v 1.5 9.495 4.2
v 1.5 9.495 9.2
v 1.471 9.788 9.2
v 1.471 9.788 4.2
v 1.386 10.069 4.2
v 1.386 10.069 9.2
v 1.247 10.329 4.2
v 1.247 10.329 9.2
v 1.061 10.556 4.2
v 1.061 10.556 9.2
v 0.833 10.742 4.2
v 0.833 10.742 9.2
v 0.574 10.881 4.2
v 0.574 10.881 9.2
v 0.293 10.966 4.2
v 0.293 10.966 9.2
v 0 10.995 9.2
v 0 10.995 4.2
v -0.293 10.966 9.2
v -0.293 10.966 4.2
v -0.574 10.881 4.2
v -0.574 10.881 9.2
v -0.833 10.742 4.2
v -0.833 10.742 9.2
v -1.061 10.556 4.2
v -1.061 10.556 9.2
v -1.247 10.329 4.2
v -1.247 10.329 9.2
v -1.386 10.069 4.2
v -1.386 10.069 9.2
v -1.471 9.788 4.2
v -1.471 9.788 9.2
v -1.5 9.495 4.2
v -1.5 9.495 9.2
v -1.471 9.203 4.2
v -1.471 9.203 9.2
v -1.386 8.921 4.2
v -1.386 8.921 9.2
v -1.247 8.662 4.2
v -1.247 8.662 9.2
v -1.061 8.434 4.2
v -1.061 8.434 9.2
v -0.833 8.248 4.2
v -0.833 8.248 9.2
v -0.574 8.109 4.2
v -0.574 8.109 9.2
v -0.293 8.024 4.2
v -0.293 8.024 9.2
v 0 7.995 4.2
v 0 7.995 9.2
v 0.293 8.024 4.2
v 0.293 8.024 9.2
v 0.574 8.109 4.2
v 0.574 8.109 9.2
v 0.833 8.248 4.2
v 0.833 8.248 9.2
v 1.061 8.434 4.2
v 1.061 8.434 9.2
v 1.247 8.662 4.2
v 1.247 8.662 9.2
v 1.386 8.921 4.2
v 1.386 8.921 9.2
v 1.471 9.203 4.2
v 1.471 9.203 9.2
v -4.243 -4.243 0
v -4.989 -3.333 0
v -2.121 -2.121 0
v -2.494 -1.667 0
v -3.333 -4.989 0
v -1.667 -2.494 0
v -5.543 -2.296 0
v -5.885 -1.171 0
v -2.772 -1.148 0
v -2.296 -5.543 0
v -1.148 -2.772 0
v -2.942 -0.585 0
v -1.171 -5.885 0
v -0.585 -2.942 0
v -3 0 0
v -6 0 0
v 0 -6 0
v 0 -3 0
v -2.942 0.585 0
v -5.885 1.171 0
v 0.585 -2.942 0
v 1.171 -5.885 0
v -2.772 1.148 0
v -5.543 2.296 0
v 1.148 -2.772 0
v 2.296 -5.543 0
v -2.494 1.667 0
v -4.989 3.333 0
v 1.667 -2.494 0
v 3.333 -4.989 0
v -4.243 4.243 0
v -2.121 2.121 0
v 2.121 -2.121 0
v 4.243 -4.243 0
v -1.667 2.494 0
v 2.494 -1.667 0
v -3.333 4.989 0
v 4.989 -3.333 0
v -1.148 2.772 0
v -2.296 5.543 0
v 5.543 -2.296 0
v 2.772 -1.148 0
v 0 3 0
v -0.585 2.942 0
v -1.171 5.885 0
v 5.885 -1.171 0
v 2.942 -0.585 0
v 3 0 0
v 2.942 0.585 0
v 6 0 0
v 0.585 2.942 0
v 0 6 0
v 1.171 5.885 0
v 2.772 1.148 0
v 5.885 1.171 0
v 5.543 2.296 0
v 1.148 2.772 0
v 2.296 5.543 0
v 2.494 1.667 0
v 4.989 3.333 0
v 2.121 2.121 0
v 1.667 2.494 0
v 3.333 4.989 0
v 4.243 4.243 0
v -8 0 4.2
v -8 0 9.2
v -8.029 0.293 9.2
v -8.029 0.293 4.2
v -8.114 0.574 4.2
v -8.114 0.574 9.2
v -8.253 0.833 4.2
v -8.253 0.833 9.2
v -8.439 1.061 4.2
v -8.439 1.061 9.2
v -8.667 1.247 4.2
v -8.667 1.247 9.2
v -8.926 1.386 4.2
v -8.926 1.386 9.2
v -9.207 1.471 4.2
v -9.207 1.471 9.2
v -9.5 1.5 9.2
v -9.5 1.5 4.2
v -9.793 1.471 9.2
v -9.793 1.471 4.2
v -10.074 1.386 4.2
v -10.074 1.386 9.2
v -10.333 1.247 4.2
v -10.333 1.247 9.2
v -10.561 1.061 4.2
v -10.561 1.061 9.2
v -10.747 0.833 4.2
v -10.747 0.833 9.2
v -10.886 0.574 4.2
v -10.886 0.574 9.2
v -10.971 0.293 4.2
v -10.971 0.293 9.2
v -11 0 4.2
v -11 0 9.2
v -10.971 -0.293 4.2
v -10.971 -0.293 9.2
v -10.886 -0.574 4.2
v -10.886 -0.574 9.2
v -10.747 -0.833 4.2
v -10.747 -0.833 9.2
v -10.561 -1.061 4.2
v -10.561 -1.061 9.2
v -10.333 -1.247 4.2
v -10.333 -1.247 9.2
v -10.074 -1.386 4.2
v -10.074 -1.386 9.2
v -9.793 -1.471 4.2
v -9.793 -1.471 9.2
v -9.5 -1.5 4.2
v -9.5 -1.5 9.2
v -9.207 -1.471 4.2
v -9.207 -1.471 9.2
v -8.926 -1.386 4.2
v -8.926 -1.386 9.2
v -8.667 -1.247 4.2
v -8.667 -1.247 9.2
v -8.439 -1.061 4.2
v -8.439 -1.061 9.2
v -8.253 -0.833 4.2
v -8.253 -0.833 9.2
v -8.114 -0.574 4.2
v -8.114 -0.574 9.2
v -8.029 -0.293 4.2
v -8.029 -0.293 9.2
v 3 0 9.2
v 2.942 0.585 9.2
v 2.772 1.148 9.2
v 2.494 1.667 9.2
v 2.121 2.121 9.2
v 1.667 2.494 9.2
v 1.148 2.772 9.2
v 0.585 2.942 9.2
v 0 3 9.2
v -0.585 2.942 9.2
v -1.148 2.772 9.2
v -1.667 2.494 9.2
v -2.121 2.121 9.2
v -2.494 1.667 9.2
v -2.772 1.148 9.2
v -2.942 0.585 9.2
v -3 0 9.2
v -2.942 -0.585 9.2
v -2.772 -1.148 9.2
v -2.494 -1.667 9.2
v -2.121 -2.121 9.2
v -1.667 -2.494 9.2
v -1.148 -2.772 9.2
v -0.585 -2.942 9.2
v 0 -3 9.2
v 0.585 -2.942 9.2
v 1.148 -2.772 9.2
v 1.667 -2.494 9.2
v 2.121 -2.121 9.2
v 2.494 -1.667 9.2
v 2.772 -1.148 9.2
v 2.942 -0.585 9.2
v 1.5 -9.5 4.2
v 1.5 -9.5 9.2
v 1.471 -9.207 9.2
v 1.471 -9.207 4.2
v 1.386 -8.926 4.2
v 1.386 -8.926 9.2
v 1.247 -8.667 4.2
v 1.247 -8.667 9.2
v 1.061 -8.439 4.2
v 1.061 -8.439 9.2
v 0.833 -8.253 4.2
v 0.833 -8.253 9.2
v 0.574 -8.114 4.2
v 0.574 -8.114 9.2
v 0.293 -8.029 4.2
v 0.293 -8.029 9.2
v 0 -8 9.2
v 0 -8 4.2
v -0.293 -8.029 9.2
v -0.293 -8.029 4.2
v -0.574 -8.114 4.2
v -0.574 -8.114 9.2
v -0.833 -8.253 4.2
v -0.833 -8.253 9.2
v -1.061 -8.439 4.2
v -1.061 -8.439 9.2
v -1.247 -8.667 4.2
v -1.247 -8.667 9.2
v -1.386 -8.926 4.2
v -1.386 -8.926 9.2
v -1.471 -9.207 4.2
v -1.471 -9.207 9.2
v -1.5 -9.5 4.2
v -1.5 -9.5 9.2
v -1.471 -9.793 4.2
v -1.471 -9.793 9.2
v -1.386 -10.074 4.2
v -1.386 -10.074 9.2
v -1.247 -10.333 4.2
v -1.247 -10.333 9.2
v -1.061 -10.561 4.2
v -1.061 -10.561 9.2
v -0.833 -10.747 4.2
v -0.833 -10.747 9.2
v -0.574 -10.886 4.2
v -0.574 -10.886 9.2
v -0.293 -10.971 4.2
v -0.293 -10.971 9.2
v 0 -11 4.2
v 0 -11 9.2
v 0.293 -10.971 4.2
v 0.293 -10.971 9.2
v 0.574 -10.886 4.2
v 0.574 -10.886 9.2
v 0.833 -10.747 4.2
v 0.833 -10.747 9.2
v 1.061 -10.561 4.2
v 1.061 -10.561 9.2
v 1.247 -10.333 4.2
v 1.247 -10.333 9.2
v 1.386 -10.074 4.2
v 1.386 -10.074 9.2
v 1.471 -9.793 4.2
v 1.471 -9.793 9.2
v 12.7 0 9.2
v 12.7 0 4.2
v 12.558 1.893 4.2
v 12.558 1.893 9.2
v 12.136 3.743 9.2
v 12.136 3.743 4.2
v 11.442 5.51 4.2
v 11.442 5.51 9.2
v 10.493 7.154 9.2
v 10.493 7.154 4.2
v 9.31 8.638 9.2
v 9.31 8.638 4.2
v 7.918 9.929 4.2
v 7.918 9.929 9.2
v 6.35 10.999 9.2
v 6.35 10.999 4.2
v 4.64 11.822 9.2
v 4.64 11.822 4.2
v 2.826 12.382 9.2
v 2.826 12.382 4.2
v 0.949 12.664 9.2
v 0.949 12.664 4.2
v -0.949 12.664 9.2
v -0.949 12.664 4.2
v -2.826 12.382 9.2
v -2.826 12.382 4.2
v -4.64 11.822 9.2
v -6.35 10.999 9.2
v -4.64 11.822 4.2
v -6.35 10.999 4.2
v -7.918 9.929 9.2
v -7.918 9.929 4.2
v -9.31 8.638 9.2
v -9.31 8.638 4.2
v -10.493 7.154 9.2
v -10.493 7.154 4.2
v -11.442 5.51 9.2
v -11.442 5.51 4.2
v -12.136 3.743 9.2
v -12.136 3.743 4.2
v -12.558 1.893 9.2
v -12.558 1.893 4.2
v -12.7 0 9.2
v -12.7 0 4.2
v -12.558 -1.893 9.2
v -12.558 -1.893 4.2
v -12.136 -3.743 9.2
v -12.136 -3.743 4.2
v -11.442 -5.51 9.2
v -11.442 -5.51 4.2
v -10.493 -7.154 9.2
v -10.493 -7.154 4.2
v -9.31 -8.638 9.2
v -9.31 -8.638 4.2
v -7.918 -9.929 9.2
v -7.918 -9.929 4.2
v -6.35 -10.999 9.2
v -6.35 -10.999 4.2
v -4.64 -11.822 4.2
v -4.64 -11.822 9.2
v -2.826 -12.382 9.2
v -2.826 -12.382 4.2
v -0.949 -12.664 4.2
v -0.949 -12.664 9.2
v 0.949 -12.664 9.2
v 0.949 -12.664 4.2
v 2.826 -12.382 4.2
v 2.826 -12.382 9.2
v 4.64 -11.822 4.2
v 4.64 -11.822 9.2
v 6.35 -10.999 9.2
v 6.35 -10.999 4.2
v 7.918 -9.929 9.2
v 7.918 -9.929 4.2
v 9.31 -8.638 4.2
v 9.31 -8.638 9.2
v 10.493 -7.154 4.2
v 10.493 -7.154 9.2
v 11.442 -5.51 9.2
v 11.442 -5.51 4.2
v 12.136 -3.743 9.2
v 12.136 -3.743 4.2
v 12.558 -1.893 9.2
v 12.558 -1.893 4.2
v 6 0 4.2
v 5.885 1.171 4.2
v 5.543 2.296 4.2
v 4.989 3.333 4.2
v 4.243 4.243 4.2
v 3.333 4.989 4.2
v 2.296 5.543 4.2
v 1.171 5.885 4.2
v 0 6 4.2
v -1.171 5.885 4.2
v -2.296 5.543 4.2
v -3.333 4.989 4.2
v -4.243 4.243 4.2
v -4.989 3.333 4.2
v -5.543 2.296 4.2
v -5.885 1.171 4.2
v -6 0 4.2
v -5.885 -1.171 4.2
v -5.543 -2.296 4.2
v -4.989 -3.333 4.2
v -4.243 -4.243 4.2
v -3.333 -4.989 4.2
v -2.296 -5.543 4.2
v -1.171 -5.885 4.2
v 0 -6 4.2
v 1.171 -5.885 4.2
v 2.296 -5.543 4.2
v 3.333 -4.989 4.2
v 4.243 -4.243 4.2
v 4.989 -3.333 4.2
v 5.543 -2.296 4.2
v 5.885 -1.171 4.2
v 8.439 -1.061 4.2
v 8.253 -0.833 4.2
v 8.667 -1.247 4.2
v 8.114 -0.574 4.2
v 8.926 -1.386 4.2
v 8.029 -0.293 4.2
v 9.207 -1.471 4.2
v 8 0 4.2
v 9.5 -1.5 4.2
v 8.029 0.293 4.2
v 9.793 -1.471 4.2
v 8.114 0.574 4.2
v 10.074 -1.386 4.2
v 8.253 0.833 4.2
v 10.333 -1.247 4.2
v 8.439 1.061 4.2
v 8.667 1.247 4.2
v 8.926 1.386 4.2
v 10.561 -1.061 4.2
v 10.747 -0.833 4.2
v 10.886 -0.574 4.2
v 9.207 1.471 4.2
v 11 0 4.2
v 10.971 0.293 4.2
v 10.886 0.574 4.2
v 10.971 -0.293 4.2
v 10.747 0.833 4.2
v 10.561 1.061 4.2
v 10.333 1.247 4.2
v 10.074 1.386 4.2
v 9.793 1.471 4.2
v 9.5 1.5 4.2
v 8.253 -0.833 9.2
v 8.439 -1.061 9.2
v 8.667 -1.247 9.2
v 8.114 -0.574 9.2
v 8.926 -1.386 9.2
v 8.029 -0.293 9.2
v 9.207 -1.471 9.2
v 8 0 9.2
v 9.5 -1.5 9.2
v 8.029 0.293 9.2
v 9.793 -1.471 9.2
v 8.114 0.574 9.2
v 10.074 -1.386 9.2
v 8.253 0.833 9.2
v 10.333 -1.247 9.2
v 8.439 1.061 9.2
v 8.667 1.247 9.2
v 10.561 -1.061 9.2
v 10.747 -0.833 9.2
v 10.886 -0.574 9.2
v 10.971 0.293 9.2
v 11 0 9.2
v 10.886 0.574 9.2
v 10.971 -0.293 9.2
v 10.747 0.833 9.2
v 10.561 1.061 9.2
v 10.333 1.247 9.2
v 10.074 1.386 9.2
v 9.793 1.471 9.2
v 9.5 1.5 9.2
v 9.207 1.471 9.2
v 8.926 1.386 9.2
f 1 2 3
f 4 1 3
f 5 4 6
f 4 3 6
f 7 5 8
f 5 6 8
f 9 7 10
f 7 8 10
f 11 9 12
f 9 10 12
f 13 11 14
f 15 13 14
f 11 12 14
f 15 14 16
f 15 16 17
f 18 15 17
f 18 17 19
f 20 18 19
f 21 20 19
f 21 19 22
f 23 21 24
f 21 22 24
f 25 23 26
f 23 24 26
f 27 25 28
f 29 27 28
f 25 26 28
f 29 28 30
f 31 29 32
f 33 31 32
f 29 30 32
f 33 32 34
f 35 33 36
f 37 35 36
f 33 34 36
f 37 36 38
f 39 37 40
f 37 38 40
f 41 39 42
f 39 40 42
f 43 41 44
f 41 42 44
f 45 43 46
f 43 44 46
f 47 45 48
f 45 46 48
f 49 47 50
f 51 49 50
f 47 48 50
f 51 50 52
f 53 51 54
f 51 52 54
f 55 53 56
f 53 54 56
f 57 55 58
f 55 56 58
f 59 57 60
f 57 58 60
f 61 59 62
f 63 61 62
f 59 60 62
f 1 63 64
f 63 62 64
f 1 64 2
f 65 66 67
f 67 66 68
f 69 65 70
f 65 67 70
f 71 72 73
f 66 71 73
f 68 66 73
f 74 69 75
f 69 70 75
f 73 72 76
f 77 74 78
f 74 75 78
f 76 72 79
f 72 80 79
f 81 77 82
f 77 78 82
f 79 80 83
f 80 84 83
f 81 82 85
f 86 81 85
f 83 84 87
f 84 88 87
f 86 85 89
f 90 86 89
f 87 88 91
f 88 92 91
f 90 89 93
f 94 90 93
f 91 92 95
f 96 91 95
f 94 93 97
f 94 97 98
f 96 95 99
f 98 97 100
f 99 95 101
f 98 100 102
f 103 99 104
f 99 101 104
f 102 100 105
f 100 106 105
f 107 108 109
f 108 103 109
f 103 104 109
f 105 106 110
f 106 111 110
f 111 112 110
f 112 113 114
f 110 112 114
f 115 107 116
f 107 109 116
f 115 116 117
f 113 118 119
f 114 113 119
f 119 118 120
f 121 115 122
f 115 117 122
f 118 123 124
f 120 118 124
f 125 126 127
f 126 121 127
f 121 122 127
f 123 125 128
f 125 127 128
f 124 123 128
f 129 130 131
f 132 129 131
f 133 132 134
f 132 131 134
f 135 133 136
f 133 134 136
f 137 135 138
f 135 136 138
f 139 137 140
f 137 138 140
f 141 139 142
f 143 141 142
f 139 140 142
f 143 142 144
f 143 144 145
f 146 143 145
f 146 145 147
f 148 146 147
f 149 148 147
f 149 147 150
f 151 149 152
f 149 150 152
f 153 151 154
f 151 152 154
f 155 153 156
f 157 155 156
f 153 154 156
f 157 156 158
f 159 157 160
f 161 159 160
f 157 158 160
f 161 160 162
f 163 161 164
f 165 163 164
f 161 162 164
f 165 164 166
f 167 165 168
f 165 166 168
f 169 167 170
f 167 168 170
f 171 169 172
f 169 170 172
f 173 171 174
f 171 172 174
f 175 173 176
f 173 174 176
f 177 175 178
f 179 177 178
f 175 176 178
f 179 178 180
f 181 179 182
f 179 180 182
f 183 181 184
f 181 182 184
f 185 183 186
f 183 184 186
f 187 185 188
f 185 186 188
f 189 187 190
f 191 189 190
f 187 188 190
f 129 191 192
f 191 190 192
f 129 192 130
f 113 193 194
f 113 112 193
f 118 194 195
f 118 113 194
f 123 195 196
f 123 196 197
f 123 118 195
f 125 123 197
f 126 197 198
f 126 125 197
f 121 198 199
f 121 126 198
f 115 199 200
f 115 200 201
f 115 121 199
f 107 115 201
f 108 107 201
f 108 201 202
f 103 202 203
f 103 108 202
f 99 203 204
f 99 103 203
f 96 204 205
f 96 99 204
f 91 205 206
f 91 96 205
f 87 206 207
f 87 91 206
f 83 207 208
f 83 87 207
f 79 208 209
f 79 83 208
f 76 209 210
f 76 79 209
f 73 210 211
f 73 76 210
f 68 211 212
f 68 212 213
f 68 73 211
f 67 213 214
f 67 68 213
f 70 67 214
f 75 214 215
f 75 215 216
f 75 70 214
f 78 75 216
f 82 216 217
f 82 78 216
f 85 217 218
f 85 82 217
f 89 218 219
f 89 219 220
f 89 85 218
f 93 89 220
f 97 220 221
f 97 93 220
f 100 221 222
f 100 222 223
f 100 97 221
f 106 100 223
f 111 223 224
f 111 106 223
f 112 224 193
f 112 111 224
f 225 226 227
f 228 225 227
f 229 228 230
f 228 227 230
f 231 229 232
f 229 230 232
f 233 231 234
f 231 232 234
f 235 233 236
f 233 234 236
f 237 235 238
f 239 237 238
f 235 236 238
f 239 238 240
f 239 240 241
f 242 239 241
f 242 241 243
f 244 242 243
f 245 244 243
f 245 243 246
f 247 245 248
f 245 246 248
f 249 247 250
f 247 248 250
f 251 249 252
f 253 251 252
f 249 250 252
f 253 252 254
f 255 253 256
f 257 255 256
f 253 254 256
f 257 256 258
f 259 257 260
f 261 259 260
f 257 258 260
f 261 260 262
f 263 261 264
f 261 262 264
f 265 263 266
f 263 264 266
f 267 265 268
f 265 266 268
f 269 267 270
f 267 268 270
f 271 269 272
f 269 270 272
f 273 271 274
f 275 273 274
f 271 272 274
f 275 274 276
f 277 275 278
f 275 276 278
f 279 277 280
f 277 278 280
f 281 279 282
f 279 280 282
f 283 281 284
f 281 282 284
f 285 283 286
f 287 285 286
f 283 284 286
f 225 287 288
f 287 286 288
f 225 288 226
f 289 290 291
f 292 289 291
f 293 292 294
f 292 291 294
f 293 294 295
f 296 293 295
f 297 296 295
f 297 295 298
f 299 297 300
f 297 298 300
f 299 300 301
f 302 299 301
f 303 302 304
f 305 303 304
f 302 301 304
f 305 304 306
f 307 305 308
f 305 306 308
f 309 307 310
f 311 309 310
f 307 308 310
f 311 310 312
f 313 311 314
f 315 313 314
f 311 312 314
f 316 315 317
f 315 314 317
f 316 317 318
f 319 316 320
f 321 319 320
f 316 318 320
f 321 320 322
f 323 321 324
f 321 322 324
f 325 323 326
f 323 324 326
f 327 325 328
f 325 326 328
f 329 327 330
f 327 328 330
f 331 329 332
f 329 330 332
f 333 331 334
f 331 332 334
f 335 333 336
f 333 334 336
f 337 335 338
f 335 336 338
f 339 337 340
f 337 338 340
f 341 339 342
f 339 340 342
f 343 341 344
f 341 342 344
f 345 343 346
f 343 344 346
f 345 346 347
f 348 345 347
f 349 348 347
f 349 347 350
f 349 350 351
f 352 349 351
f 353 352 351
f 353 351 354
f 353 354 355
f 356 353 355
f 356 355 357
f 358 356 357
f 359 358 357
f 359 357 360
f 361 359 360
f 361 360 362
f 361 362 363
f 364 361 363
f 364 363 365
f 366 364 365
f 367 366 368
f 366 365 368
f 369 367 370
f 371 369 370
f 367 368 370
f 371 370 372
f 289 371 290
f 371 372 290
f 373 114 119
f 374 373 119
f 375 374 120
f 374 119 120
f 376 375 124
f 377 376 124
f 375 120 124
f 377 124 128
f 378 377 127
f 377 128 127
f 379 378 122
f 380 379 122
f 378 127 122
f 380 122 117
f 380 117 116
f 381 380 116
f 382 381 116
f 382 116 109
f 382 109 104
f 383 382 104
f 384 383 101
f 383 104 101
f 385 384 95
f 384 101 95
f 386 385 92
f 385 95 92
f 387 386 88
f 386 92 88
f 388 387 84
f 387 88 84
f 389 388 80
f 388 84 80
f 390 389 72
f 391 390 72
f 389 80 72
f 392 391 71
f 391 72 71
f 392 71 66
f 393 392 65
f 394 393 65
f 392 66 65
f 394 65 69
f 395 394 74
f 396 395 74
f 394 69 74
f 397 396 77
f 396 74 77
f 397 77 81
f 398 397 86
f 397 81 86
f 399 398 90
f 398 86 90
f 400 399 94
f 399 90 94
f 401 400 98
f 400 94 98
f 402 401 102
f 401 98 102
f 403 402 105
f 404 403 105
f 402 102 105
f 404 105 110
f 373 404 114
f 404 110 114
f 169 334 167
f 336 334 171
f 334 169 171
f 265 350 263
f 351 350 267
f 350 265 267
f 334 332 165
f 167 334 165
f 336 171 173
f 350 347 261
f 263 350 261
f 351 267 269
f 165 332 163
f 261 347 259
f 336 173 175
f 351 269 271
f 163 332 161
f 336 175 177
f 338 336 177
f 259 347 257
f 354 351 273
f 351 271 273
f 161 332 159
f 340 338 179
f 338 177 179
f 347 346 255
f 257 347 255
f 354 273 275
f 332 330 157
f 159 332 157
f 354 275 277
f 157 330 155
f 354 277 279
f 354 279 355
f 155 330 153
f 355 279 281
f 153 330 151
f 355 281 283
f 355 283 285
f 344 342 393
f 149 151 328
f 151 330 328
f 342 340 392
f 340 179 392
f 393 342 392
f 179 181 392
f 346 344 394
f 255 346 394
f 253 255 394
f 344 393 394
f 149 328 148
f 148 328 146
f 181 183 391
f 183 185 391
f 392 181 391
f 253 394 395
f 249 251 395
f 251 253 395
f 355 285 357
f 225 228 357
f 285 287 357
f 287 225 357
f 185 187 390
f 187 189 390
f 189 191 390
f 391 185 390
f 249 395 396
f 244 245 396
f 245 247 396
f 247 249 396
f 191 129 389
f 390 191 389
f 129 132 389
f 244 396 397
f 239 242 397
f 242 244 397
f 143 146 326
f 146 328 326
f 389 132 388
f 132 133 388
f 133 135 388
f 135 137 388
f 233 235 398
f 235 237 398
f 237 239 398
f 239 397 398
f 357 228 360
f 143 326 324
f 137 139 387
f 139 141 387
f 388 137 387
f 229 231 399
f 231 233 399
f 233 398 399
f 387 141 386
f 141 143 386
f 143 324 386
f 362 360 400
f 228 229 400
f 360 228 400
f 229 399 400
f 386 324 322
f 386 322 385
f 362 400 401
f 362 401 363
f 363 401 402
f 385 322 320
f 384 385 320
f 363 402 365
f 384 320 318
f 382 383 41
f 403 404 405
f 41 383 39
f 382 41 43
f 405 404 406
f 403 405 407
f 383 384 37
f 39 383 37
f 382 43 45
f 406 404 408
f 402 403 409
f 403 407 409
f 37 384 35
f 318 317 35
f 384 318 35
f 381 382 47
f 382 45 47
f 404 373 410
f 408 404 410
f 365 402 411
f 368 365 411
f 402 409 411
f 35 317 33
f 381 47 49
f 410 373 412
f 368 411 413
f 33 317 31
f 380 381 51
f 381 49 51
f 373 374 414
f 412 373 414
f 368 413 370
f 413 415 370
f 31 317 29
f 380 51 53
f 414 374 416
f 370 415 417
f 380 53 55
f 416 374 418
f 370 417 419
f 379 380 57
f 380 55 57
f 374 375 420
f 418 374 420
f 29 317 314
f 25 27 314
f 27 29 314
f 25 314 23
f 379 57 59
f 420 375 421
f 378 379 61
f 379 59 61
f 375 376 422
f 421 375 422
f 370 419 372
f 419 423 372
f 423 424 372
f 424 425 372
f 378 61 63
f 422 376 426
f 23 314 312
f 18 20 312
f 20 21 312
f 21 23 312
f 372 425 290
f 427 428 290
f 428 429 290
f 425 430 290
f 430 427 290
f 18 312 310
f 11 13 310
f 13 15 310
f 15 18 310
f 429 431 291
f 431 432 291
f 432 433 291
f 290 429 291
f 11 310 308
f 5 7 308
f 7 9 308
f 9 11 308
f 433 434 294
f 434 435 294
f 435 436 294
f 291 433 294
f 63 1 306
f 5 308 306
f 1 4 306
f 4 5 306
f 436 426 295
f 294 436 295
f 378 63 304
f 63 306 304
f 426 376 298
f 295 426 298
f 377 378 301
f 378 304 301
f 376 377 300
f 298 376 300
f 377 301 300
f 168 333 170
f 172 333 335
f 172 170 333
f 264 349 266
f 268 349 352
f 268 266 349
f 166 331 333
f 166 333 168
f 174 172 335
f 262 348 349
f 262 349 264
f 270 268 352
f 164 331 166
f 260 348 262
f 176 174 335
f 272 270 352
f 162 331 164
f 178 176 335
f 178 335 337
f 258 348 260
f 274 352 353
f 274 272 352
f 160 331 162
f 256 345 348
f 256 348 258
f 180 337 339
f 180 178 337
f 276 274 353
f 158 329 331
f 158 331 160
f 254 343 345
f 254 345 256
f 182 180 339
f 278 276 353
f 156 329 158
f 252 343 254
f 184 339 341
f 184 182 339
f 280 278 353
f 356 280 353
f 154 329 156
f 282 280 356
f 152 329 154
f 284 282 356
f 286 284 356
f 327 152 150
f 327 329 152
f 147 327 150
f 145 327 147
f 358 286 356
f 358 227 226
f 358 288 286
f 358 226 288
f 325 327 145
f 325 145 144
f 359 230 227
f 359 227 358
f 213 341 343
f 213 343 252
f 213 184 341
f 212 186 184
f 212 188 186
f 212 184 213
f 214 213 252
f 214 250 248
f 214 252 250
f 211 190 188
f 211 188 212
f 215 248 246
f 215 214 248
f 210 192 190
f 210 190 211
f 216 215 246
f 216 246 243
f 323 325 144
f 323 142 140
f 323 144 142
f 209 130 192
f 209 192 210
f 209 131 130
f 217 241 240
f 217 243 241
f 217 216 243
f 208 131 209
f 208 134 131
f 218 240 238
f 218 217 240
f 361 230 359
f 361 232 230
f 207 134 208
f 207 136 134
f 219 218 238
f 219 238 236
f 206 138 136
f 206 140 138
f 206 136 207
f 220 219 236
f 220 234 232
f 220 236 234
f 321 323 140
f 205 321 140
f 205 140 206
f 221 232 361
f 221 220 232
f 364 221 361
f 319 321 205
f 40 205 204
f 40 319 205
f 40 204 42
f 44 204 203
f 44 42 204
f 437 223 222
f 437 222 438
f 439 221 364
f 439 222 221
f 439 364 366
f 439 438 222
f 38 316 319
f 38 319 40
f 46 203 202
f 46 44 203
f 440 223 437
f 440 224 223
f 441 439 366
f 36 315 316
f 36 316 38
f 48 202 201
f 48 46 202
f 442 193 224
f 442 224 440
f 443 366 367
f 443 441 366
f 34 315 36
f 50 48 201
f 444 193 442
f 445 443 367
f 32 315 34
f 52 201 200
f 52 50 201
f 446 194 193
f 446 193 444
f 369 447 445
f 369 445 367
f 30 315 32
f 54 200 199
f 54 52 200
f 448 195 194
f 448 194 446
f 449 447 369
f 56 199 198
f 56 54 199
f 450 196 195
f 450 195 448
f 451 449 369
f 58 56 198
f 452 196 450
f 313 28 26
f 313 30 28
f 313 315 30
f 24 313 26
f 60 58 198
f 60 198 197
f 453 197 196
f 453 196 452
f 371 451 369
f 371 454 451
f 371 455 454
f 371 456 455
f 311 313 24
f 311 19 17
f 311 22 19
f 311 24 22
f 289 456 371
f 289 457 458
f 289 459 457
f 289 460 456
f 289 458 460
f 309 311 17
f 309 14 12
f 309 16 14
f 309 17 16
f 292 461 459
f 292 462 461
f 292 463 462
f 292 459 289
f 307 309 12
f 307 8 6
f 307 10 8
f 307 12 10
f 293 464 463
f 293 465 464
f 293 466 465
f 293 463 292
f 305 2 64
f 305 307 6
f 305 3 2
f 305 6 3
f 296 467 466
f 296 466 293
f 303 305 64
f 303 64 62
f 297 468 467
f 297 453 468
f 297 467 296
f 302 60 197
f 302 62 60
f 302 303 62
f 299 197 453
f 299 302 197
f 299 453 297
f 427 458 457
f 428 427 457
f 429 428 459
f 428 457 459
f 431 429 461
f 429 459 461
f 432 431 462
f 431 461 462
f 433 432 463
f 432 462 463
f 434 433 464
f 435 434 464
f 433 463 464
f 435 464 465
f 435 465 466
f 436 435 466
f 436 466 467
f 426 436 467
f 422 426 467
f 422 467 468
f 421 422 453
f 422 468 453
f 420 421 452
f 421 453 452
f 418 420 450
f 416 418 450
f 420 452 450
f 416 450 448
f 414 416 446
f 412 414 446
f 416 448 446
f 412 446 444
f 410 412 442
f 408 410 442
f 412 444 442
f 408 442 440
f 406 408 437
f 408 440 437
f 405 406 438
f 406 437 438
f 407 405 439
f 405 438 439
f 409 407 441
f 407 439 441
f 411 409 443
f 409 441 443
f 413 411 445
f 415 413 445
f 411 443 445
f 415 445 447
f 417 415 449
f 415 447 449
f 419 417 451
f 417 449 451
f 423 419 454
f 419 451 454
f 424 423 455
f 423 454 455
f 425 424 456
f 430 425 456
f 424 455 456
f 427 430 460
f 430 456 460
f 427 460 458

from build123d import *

# Parameters (mm, degrees)
SKETCH1_R           = 6
SKETCH1_R_2         = 3
BOSS_EXTRUDE1_DEPTH = 4.2
SKETCH2_R           = 12.7
SKETCH2_R_2         = 3
BOSS_EXTRUDE2_DEPTH = 5
SKETCH3_R           = 1.5
CUT_EXTRUDE1_DEPTH  = 5


with BuildPart() as part:
    # Sketch1 → Boss-Extrude1 (new body)
    with BuildSketch(Plane.XY):
        Circle(SKETCH1_R)
        Circle(SKETCH1_R_2, mode=Mode.SUBTRACT)
    extrude(amount=BOSS_EXTRUDE1_DEPTH)

    # Sketch2 → Boss-Extrude2 (add)
    with BuildSketch(Plane.XY.offset(4.2)):
        Circle(SKETCH2_R)
        Circle(SKETCH2_R_2, mode=Mode.SUBTRACT)
    extrude(amount=BOSS_EXTRUDE2_DEPTH)

    # Sketch3 → Cut-Extrude1 (cut)
    with BuildSketch(Plane.XY.offset(9.2)):
        with Locations((0, 9.49515399)):
            Circle(SKETCH3_R)
        with Locations((0, -9.5)):
            Circle(SKETCH3_R)
        with Locations((9.5, 0)):
            Circle(SKETCH3_R)
        with Locations((-9.5, 0)):
            Circle(SKETCH3_R)
    extrude(amount=-CUT_EXTRUDE1_DEPTH, mode=Mode.SUBTRACT)


solid = part.part
